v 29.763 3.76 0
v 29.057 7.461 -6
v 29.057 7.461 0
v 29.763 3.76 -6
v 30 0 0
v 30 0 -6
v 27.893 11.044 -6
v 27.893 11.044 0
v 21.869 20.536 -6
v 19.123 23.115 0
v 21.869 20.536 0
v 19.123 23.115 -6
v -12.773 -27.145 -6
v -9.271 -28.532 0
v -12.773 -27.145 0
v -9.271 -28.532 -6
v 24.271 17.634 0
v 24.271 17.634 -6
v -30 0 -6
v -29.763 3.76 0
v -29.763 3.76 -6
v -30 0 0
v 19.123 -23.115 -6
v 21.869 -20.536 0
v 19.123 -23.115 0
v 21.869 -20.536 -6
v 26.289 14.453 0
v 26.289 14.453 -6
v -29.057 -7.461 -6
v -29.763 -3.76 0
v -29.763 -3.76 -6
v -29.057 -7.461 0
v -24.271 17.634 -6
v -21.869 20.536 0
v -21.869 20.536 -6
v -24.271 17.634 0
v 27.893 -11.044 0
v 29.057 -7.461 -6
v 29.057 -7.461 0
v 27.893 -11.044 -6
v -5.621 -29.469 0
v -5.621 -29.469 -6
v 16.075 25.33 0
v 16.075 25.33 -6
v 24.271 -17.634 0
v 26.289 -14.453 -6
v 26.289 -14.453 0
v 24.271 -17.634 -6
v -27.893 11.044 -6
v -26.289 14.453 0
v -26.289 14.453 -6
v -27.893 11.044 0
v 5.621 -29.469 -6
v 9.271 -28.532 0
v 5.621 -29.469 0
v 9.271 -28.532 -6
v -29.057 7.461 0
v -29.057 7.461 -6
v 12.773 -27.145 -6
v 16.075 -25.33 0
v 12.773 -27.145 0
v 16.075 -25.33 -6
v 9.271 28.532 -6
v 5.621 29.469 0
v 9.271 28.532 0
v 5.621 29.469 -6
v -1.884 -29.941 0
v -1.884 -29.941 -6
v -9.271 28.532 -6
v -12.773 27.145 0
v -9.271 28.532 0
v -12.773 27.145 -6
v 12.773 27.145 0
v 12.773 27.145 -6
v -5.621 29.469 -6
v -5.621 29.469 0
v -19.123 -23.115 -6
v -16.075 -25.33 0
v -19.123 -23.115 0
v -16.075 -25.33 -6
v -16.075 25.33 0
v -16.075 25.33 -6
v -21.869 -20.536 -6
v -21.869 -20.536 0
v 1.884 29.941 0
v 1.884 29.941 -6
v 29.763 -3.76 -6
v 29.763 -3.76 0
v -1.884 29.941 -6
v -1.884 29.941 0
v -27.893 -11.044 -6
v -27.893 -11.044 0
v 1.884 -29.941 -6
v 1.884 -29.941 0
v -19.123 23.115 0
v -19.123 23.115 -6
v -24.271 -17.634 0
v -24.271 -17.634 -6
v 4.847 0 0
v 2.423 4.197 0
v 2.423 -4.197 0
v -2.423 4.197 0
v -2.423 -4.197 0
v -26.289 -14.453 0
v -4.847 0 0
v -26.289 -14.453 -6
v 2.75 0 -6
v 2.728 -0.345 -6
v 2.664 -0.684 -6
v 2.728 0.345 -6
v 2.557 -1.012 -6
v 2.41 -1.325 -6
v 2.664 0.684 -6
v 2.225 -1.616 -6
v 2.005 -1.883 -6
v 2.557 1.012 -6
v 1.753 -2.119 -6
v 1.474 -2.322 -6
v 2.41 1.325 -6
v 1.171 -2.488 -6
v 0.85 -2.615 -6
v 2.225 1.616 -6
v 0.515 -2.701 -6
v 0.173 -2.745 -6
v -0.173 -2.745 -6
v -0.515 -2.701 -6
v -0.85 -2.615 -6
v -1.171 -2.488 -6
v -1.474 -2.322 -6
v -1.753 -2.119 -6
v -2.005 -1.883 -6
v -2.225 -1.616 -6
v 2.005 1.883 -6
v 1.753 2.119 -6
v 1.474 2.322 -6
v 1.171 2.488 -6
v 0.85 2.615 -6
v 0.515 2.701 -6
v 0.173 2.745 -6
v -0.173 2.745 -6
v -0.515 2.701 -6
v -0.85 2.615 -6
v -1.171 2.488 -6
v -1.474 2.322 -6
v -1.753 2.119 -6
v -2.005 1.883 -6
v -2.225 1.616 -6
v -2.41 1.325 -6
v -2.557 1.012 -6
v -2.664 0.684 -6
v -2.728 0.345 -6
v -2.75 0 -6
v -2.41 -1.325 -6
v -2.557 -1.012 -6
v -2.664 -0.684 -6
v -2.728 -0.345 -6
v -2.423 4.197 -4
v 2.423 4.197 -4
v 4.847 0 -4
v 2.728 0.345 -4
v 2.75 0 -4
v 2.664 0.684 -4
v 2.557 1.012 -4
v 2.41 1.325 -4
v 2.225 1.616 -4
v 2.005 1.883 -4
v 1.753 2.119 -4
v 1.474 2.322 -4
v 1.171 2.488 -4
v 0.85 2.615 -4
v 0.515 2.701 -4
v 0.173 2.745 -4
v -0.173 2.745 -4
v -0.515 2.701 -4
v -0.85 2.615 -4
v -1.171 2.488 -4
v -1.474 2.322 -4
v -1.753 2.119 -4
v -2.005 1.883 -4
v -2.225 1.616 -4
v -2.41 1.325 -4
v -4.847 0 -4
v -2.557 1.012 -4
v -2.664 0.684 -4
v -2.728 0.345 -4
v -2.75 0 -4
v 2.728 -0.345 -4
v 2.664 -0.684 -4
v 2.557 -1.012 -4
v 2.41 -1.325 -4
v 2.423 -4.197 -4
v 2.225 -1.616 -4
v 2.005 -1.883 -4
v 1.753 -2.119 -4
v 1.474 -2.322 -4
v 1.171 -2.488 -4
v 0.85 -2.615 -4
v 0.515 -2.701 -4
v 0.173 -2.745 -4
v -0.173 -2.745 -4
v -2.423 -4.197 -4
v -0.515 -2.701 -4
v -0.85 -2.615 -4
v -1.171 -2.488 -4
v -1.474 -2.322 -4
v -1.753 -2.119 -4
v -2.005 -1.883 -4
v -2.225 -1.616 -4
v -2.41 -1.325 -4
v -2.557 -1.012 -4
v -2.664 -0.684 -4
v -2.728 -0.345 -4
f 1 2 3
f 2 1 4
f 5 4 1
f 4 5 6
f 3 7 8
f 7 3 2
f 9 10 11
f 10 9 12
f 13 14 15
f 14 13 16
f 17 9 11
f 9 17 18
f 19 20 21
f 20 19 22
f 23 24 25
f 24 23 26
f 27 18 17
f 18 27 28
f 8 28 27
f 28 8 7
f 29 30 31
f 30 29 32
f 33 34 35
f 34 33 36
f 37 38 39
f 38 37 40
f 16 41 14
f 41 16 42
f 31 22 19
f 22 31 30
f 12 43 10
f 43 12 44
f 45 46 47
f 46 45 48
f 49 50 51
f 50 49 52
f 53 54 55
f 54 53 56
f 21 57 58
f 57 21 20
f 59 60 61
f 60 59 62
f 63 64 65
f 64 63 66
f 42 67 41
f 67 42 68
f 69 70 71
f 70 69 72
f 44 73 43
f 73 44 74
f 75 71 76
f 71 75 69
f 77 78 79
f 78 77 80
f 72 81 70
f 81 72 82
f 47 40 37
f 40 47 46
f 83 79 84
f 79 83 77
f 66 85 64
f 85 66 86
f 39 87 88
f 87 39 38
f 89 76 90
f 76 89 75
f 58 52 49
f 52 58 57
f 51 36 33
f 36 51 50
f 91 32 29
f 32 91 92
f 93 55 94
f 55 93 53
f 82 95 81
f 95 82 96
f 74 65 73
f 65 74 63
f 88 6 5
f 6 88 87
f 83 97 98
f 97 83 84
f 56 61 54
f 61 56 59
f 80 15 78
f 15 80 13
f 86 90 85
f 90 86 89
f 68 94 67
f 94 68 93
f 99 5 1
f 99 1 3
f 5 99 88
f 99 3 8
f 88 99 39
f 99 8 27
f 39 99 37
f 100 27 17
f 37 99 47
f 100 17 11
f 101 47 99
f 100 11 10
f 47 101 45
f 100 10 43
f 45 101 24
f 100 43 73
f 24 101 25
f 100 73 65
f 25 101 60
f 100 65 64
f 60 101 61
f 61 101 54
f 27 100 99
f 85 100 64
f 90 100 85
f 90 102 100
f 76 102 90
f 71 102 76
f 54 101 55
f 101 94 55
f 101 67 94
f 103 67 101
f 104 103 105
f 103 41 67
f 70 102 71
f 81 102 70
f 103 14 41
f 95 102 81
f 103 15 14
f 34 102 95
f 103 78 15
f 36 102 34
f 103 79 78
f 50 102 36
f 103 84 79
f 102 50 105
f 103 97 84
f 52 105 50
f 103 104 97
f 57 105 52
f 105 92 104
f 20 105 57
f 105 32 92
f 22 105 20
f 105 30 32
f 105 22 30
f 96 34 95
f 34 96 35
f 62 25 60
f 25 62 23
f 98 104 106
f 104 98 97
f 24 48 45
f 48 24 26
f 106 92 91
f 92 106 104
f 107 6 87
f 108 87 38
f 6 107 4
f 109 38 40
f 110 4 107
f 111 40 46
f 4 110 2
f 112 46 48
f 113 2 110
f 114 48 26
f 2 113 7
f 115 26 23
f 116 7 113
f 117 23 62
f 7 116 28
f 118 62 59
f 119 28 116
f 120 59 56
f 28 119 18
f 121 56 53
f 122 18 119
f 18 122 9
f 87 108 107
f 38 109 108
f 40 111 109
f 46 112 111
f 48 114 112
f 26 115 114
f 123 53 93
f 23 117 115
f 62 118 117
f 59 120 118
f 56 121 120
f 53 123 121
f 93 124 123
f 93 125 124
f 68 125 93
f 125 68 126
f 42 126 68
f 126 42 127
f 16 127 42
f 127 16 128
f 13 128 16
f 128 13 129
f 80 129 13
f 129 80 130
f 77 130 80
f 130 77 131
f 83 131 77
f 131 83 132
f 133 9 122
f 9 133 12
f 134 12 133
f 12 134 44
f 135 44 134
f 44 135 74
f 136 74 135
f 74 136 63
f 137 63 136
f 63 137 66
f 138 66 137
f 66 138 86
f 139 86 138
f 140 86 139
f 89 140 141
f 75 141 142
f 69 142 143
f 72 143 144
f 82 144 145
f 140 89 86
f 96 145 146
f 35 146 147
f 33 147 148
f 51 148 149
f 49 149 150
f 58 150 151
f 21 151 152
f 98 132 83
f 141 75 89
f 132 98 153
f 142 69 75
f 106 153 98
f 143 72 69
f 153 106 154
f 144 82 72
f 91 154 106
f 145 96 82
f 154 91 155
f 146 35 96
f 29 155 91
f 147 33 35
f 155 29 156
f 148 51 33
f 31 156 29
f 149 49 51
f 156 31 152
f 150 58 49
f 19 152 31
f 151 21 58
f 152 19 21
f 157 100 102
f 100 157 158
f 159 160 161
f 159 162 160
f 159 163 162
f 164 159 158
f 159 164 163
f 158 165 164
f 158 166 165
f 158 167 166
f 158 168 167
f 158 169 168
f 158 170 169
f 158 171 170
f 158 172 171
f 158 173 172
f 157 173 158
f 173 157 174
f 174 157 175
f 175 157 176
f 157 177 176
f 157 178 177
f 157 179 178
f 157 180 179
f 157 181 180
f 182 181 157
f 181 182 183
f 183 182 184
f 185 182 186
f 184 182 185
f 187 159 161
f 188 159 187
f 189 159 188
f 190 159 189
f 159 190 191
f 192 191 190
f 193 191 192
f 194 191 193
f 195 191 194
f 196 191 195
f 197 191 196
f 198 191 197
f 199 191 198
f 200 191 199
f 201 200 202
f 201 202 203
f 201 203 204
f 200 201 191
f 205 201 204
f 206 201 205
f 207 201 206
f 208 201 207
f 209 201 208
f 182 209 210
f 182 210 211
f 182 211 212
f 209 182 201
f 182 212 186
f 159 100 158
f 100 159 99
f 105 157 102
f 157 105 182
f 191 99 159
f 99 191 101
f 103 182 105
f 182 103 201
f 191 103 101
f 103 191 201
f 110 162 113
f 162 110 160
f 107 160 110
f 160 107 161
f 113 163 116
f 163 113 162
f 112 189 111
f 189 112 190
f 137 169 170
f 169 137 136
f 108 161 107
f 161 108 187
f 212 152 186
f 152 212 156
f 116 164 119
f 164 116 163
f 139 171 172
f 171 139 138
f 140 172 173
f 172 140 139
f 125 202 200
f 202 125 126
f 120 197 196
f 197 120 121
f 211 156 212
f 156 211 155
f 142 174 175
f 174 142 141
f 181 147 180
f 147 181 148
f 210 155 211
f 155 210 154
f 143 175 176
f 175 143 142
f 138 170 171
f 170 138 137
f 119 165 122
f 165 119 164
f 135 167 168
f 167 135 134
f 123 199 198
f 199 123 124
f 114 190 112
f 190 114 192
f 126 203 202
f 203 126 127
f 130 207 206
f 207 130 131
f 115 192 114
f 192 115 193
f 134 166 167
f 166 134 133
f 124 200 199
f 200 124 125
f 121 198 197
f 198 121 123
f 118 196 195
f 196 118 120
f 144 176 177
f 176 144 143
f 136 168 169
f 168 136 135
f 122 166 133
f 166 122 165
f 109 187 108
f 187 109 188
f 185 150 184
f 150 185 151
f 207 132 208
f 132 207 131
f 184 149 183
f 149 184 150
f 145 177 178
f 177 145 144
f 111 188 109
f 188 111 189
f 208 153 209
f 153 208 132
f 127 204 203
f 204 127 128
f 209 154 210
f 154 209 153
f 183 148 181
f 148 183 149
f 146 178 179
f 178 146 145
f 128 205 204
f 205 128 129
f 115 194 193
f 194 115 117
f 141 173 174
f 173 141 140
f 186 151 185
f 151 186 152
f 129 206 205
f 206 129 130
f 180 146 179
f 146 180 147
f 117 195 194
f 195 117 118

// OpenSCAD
$fn = 50;


difference() {
	union() {
		translate(v = [0, 0, -6.0000000000]) {
			cylinder(h = 6.0000000000, r = 30.0000000000);
		}
		translate(v = [0, 0, -4.5000000000]) {
			cylinder(h = 4.5000000000, r = 2.8750000000);
		}
	}
	union() {
		translate(v = [0, 0, 0]) {
			rotate(a = [0, 0, 0]) {
				difference() {
					union() {
						translate(v = [0, 0, -4]) {
							linear_extrude(height = 4) {
								polygon(points = [[4.8468000000, 0.0000000000], [2.4234000000, 4.1974519271], [-2.4234000000, 4.1974519271], [-4.8468000000, 0.0000000000], [-2.4234000000, -4.1974519271], [2.4234000000, -4.1974519271]]);
							}
						}
					}
					union();
				}
			}
		}
		#translate(v = [0, 0, -100.0000000000]) {
			cylinder(h = 200, r = 2.7500000000);
		}
	}
}
